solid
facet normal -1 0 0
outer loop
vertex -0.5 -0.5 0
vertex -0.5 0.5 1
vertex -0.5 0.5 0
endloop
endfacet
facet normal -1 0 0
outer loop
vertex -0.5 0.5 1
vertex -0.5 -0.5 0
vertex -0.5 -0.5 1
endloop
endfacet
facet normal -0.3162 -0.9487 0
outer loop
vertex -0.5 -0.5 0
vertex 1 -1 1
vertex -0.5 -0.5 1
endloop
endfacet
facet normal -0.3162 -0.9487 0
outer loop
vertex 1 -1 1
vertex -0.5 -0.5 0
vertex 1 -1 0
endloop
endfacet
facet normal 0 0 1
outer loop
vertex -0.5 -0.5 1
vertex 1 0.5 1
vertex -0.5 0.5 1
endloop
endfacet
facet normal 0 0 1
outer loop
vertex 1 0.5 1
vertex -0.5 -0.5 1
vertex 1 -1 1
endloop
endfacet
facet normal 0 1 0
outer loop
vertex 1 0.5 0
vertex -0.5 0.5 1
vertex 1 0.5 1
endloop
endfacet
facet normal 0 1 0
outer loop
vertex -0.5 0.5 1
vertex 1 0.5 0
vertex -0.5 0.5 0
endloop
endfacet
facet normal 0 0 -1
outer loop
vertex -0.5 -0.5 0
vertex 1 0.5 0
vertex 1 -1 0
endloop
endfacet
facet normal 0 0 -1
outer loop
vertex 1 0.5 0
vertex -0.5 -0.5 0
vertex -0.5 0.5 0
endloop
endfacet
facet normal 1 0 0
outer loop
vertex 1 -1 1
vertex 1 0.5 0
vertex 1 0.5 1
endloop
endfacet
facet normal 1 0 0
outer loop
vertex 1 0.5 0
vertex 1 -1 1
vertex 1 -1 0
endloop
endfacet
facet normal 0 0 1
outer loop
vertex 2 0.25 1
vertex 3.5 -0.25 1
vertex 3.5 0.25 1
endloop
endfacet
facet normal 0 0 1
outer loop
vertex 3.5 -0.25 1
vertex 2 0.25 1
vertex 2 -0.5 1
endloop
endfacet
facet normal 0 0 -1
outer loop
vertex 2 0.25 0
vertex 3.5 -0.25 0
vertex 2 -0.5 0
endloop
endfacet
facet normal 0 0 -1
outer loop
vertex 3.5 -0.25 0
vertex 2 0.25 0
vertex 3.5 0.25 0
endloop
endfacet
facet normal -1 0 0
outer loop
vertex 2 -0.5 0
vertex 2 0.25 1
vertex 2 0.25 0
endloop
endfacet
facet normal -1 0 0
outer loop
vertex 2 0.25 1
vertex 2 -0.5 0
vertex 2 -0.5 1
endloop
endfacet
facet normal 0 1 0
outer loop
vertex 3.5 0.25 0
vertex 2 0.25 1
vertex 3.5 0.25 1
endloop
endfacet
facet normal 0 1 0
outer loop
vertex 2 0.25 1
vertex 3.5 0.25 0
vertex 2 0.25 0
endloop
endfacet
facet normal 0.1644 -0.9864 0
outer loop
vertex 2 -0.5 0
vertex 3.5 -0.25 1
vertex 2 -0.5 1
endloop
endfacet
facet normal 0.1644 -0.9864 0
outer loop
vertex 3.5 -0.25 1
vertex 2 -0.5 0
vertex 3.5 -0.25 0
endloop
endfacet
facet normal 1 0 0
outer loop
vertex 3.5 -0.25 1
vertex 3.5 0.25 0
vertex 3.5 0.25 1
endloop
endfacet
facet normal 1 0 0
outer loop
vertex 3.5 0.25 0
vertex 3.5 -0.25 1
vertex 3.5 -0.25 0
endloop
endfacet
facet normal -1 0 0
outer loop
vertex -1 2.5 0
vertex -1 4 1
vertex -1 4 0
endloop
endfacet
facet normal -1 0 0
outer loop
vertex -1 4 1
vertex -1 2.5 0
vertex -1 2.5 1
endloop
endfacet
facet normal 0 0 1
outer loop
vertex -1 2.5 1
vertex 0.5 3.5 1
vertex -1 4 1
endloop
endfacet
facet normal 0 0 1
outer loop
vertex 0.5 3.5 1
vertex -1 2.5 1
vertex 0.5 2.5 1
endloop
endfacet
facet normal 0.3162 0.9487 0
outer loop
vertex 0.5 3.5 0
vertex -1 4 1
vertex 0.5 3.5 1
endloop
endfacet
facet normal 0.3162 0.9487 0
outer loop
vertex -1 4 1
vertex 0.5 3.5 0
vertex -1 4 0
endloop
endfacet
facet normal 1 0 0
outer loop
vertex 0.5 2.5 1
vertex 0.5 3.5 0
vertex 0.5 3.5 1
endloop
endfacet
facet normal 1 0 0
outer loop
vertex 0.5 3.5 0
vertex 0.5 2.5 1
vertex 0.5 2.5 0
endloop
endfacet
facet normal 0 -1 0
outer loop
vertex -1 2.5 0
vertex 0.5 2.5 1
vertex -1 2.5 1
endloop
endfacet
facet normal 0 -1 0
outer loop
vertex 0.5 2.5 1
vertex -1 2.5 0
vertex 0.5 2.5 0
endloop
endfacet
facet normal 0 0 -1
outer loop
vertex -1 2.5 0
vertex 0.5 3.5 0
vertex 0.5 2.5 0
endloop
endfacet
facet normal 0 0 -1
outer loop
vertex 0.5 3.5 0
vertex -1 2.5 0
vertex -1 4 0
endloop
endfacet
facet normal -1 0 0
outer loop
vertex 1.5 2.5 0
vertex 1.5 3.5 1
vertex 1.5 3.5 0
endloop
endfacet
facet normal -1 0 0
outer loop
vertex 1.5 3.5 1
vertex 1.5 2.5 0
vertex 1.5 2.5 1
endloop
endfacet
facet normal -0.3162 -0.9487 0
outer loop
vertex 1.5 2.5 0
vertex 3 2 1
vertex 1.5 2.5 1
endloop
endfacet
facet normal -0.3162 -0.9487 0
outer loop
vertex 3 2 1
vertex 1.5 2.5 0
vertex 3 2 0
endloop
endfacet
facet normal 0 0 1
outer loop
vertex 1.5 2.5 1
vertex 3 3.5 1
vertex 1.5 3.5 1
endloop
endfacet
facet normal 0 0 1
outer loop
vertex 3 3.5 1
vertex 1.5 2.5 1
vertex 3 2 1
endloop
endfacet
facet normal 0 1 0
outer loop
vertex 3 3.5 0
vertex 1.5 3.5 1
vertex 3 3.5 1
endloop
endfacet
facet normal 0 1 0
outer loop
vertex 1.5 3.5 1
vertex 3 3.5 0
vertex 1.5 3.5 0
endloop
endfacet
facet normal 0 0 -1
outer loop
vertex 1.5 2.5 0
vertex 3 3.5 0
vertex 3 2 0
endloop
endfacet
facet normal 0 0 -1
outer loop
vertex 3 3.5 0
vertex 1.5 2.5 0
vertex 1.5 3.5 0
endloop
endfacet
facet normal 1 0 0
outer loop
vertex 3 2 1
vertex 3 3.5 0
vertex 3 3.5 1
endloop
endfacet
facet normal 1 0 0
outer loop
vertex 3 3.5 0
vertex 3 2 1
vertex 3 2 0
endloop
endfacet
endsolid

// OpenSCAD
module obj2D() polygon([[-0.5,-0.5], [1,-0.5], [1,1], [-0.5, 0.5]])
square([2,3], center=true);

linear_extrude(1) scale([1, -1]) obj2D();
translate([3,0,0]) linear_extrude(1) scale([-1, -0.5]) obj2D();
translate([0,3,0]) linear_extrude(1) mirror() obj2D();
translate([2,3,0]) linear_extrude(1) mirror([0,1]) obj2D();
